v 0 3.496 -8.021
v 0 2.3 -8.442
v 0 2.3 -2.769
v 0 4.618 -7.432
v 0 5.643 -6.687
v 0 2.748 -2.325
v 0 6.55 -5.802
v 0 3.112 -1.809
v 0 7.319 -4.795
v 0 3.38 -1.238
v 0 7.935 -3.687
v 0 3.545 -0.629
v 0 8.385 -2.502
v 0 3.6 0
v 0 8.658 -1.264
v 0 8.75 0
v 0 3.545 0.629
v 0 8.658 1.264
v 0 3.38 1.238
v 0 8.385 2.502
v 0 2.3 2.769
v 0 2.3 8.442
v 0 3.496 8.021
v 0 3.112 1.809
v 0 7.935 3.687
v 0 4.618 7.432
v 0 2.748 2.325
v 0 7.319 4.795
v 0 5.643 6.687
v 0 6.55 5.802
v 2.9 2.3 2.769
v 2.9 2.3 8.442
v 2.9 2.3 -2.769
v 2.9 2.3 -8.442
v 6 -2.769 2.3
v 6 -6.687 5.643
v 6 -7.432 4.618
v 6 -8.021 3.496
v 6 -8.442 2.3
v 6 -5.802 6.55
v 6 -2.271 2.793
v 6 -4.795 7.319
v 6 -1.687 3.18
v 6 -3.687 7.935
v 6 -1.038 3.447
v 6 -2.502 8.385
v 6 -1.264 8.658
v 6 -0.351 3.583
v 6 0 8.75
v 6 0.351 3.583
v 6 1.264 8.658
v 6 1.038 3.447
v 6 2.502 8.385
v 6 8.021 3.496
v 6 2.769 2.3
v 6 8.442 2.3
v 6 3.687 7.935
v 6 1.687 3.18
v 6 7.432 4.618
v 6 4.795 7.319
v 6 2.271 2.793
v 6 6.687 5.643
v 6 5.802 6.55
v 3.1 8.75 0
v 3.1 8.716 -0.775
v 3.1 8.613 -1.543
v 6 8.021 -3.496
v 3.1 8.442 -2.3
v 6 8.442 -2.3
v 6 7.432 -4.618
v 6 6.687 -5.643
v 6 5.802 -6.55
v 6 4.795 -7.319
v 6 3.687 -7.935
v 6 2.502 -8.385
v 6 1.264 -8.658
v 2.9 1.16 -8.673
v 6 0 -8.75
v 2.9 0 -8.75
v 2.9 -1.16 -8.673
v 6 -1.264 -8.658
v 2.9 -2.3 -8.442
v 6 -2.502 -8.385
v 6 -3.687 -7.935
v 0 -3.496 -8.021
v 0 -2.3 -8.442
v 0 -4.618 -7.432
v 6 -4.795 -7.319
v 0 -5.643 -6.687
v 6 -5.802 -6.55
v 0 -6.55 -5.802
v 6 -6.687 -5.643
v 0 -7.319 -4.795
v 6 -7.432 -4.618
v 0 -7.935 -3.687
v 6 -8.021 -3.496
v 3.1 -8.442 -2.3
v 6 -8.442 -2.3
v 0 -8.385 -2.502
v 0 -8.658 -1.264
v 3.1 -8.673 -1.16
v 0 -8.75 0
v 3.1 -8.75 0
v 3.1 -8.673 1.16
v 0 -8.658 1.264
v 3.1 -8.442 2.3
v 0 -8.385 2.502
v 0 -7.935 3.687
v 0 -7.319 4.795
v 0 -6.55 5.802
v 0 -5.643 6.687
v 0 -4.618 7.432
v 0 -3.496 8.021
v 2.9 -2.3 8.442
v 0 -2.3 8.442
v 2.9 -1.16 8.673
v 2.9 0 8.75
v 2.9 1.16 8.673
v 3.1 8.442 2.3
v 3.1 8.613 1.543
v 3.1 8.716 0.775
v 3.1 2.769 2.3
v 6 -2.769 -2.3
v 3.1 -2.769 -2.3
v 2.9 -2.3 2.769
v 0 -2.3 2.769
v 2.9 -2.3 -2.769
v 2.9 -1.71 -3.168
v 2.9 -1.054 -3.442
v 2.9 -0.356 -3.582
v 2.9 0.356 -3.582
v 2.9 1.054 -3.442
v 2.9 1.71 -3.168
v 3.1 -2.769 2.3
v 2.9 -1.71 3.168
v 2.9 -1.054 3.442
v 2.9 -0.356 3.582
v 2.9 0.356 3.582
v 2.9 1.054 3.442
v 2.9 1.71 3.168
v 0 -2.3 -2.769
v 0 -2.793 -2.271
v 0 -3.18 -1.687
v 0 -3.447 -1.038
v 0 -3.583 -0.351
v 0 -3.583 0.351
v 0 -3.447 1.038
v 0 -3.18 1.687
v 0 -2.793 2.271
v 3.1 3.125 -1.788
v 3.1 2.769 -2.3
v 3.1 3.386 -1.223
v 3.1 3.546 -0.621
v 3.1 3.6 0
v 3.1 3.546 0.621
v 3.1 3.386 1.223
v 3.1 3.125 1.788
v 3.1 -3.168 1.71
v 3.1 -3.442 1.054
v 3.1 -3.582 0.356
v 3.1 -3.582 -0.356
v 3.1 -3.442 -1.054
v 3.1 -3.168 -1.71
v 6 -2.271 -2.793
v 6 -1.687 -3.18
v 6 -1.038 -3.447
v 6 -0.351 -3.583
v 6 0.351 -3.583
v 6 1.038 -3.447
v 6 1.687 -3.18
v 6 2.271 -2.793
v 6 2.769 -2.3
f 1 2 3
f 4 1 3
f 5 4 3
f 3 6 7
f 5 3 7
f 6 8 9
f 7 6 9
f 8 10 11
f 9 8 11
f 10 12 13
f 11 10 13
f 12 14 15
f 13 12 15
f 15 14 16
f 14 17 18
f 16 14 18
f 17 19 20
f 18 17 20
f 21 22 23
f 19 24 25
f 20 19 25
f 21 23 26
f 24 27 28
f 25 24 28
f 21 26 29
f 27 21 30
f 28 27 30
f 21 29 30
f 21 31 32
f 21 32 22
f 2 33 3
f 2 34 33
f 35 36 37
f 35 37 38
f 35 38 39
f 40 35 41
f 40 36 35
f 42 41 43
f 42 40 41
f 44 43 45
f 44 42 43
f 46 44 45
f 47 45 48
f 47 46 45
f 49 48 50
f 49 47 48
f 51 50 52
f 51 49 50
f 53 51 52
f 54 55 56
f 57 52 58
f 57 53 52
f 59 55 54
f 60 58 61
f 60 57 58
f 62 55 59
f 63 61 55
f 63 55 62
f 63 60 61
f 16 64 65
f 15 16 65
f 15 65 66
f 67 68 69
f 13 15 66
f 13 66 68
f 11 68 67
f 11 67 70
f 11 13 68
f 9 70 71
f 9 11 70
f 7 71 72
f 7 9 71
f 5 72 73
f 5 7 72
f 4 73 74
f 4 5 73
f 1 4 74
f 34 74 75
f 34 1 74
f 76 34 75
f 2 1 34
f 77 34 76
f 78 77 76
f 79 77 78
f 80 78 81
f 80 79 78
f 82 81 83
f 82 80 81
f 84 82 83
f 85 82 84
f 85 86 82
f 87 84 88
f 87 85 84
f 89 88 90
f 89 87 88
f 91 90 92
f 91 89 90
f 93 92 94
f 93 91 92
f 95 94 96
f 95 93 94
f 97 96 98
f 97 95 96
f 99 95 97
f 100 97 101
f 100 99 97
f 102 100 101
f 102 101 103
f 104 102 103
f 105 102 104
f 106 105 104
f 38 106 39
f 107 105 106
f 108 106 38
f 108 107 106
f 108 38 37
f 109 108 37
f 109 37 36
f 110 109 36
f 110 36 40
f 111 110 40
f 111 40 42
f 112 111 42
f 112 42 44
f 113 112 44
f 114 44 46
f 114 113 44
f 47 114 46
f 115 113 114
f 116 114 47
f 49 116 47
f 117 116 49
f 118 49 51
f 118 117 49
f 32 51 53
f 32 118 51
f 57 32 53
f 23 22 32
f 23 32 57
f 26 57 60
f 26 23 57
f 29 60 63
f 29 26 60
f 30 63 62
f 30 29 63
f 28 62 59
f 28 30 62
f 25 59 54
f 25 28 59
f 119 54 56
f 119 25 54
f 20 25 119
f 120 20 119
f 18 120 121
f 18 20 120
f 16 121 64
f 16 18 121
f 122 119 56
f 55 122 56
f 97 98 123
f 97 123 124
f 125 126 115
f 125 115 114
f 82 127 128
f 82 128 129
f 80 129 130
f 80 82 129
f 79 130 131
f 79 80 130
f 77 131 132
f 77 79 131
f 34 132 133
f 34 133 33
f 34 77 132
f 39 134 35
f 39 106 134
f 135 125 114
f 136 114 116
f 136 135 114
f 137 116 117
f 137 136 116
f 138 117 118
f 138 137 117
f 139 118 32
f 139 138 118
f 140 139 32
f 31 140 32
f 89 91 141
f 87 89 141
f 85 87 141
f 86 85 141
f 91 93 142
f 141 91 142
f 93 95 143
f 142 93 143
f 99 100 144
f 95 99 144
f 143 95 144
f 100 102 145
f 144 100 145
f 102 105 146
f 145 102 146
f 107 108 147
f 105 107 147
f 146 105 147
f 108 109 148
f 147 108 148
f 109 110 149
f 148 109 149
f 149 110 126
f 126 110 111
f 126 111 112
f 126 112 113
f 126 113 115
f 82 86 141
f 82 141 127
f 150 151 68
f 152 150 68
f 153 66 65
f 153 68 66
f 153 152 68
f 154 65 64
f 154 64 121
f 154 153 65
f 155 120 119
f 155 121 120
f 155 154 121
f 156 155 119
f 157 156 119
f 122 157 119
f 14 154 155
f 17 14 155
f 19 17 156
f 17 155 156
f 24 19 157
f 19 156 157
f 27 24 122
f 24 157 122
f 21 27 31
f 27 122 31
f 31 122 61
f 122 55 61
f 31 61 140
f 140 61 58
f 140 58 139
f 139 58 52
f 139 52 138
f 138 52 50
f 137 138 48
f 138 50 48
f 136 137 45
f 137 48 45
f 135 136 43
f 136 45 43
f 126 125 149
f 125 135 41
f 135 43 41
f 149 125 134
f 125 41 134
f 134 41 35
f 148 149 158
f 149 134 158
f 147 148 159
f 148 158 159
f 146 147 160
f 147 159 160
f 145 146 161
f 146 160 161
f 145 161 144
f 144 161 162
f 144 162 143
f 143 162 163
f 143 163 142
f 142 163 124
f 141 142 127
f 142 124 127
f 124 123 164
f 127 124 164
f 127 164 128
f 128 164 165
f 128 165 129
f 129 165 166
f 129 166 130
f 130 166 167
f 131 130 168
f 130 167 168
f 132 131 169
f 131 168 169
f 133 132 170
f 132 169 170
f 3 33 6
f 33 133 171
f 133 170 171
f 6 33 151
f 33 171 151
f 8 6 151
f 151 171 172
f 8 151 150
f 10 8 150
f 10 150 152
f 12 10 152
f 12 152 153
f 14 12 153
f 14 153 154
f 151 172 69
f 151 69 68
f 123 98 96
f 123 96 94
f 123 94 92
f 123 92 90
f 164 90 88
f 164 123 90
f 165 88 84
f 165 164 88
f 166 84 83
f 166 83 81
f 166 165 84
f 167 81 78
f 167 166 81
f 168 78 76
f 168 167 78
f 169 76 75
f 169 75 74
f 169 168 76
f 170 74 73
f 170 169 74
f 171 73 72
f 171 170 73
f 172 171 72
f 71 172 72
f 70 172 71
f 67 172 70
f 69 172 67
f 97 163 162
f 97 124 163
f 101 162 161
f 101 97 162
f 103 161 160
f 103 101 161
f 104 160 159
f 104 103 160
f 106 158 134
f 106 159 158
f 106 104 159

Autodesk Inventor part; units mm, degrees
sketch "Sketch_1" plane through (0, 0, 0) normal (0, 0, 1) x (1, 0, 0)
  line L0 (6, 0) -> (0, 0)
  line L1 (0, 8.75) -> (0, 3.6)
  line L2 (0, 3.6) -> (6, 3.6)
  line L3 (6, 3.6) -> (6, 8.75)
  line L4 (6, 8.75) -> (0, 8.75)
revolve "Revolution1" add sketch "Sketch_1" angle 360 about axis through (6, 0, 0) along (1, 0, 0)
sketch "Sketch_2" plane through (0, 0, 0) normal (0, 0, 1) x (1, 0, 0)
  line L0 (0, -2.3) -> (2.9, -2.3)
  line L1 (2.9, -2.3) -> (2.9, 2.3)
  line L2 (2.9, 2.3) -> (0, 2.3)
  line L3 (0, 2.3) -> (0, -2.3)
extrude "Extrusion1" cut sketch "Sketch_2" along normal mid plane 17.5
sketch "Sketch_3" plane through (0, 0, 0) normal (0, 1, 0) x (-1, 0, 0)
  line L0 (-3.1, -2.3) -> (-3.1, 2.3)
  line L1 (-3.1, 2.3) -> (-6, 2.3)
  line L2 (-6, 2.3) -> (-6, -2.3)
  line L3 (-6, -2.3) -> (-3.1, -2.3)
extrude "Extrusion2" cut sketch "Sketch_3" along normal mid plane 17.5
ref_plane "C_XY" through (3, 0, 0) normal (1, 0, 0) x (0, 0, -1)
ref_plane "C_YZ" through (3, 0, 0) normal (0, 0, -1) x (0, 1, 0)
ref_plane "C_ZX" through (3, 0, 0) normal (0, 1, 0) x (1, 0, 0)
properties part number "MCOC_spacer17"
